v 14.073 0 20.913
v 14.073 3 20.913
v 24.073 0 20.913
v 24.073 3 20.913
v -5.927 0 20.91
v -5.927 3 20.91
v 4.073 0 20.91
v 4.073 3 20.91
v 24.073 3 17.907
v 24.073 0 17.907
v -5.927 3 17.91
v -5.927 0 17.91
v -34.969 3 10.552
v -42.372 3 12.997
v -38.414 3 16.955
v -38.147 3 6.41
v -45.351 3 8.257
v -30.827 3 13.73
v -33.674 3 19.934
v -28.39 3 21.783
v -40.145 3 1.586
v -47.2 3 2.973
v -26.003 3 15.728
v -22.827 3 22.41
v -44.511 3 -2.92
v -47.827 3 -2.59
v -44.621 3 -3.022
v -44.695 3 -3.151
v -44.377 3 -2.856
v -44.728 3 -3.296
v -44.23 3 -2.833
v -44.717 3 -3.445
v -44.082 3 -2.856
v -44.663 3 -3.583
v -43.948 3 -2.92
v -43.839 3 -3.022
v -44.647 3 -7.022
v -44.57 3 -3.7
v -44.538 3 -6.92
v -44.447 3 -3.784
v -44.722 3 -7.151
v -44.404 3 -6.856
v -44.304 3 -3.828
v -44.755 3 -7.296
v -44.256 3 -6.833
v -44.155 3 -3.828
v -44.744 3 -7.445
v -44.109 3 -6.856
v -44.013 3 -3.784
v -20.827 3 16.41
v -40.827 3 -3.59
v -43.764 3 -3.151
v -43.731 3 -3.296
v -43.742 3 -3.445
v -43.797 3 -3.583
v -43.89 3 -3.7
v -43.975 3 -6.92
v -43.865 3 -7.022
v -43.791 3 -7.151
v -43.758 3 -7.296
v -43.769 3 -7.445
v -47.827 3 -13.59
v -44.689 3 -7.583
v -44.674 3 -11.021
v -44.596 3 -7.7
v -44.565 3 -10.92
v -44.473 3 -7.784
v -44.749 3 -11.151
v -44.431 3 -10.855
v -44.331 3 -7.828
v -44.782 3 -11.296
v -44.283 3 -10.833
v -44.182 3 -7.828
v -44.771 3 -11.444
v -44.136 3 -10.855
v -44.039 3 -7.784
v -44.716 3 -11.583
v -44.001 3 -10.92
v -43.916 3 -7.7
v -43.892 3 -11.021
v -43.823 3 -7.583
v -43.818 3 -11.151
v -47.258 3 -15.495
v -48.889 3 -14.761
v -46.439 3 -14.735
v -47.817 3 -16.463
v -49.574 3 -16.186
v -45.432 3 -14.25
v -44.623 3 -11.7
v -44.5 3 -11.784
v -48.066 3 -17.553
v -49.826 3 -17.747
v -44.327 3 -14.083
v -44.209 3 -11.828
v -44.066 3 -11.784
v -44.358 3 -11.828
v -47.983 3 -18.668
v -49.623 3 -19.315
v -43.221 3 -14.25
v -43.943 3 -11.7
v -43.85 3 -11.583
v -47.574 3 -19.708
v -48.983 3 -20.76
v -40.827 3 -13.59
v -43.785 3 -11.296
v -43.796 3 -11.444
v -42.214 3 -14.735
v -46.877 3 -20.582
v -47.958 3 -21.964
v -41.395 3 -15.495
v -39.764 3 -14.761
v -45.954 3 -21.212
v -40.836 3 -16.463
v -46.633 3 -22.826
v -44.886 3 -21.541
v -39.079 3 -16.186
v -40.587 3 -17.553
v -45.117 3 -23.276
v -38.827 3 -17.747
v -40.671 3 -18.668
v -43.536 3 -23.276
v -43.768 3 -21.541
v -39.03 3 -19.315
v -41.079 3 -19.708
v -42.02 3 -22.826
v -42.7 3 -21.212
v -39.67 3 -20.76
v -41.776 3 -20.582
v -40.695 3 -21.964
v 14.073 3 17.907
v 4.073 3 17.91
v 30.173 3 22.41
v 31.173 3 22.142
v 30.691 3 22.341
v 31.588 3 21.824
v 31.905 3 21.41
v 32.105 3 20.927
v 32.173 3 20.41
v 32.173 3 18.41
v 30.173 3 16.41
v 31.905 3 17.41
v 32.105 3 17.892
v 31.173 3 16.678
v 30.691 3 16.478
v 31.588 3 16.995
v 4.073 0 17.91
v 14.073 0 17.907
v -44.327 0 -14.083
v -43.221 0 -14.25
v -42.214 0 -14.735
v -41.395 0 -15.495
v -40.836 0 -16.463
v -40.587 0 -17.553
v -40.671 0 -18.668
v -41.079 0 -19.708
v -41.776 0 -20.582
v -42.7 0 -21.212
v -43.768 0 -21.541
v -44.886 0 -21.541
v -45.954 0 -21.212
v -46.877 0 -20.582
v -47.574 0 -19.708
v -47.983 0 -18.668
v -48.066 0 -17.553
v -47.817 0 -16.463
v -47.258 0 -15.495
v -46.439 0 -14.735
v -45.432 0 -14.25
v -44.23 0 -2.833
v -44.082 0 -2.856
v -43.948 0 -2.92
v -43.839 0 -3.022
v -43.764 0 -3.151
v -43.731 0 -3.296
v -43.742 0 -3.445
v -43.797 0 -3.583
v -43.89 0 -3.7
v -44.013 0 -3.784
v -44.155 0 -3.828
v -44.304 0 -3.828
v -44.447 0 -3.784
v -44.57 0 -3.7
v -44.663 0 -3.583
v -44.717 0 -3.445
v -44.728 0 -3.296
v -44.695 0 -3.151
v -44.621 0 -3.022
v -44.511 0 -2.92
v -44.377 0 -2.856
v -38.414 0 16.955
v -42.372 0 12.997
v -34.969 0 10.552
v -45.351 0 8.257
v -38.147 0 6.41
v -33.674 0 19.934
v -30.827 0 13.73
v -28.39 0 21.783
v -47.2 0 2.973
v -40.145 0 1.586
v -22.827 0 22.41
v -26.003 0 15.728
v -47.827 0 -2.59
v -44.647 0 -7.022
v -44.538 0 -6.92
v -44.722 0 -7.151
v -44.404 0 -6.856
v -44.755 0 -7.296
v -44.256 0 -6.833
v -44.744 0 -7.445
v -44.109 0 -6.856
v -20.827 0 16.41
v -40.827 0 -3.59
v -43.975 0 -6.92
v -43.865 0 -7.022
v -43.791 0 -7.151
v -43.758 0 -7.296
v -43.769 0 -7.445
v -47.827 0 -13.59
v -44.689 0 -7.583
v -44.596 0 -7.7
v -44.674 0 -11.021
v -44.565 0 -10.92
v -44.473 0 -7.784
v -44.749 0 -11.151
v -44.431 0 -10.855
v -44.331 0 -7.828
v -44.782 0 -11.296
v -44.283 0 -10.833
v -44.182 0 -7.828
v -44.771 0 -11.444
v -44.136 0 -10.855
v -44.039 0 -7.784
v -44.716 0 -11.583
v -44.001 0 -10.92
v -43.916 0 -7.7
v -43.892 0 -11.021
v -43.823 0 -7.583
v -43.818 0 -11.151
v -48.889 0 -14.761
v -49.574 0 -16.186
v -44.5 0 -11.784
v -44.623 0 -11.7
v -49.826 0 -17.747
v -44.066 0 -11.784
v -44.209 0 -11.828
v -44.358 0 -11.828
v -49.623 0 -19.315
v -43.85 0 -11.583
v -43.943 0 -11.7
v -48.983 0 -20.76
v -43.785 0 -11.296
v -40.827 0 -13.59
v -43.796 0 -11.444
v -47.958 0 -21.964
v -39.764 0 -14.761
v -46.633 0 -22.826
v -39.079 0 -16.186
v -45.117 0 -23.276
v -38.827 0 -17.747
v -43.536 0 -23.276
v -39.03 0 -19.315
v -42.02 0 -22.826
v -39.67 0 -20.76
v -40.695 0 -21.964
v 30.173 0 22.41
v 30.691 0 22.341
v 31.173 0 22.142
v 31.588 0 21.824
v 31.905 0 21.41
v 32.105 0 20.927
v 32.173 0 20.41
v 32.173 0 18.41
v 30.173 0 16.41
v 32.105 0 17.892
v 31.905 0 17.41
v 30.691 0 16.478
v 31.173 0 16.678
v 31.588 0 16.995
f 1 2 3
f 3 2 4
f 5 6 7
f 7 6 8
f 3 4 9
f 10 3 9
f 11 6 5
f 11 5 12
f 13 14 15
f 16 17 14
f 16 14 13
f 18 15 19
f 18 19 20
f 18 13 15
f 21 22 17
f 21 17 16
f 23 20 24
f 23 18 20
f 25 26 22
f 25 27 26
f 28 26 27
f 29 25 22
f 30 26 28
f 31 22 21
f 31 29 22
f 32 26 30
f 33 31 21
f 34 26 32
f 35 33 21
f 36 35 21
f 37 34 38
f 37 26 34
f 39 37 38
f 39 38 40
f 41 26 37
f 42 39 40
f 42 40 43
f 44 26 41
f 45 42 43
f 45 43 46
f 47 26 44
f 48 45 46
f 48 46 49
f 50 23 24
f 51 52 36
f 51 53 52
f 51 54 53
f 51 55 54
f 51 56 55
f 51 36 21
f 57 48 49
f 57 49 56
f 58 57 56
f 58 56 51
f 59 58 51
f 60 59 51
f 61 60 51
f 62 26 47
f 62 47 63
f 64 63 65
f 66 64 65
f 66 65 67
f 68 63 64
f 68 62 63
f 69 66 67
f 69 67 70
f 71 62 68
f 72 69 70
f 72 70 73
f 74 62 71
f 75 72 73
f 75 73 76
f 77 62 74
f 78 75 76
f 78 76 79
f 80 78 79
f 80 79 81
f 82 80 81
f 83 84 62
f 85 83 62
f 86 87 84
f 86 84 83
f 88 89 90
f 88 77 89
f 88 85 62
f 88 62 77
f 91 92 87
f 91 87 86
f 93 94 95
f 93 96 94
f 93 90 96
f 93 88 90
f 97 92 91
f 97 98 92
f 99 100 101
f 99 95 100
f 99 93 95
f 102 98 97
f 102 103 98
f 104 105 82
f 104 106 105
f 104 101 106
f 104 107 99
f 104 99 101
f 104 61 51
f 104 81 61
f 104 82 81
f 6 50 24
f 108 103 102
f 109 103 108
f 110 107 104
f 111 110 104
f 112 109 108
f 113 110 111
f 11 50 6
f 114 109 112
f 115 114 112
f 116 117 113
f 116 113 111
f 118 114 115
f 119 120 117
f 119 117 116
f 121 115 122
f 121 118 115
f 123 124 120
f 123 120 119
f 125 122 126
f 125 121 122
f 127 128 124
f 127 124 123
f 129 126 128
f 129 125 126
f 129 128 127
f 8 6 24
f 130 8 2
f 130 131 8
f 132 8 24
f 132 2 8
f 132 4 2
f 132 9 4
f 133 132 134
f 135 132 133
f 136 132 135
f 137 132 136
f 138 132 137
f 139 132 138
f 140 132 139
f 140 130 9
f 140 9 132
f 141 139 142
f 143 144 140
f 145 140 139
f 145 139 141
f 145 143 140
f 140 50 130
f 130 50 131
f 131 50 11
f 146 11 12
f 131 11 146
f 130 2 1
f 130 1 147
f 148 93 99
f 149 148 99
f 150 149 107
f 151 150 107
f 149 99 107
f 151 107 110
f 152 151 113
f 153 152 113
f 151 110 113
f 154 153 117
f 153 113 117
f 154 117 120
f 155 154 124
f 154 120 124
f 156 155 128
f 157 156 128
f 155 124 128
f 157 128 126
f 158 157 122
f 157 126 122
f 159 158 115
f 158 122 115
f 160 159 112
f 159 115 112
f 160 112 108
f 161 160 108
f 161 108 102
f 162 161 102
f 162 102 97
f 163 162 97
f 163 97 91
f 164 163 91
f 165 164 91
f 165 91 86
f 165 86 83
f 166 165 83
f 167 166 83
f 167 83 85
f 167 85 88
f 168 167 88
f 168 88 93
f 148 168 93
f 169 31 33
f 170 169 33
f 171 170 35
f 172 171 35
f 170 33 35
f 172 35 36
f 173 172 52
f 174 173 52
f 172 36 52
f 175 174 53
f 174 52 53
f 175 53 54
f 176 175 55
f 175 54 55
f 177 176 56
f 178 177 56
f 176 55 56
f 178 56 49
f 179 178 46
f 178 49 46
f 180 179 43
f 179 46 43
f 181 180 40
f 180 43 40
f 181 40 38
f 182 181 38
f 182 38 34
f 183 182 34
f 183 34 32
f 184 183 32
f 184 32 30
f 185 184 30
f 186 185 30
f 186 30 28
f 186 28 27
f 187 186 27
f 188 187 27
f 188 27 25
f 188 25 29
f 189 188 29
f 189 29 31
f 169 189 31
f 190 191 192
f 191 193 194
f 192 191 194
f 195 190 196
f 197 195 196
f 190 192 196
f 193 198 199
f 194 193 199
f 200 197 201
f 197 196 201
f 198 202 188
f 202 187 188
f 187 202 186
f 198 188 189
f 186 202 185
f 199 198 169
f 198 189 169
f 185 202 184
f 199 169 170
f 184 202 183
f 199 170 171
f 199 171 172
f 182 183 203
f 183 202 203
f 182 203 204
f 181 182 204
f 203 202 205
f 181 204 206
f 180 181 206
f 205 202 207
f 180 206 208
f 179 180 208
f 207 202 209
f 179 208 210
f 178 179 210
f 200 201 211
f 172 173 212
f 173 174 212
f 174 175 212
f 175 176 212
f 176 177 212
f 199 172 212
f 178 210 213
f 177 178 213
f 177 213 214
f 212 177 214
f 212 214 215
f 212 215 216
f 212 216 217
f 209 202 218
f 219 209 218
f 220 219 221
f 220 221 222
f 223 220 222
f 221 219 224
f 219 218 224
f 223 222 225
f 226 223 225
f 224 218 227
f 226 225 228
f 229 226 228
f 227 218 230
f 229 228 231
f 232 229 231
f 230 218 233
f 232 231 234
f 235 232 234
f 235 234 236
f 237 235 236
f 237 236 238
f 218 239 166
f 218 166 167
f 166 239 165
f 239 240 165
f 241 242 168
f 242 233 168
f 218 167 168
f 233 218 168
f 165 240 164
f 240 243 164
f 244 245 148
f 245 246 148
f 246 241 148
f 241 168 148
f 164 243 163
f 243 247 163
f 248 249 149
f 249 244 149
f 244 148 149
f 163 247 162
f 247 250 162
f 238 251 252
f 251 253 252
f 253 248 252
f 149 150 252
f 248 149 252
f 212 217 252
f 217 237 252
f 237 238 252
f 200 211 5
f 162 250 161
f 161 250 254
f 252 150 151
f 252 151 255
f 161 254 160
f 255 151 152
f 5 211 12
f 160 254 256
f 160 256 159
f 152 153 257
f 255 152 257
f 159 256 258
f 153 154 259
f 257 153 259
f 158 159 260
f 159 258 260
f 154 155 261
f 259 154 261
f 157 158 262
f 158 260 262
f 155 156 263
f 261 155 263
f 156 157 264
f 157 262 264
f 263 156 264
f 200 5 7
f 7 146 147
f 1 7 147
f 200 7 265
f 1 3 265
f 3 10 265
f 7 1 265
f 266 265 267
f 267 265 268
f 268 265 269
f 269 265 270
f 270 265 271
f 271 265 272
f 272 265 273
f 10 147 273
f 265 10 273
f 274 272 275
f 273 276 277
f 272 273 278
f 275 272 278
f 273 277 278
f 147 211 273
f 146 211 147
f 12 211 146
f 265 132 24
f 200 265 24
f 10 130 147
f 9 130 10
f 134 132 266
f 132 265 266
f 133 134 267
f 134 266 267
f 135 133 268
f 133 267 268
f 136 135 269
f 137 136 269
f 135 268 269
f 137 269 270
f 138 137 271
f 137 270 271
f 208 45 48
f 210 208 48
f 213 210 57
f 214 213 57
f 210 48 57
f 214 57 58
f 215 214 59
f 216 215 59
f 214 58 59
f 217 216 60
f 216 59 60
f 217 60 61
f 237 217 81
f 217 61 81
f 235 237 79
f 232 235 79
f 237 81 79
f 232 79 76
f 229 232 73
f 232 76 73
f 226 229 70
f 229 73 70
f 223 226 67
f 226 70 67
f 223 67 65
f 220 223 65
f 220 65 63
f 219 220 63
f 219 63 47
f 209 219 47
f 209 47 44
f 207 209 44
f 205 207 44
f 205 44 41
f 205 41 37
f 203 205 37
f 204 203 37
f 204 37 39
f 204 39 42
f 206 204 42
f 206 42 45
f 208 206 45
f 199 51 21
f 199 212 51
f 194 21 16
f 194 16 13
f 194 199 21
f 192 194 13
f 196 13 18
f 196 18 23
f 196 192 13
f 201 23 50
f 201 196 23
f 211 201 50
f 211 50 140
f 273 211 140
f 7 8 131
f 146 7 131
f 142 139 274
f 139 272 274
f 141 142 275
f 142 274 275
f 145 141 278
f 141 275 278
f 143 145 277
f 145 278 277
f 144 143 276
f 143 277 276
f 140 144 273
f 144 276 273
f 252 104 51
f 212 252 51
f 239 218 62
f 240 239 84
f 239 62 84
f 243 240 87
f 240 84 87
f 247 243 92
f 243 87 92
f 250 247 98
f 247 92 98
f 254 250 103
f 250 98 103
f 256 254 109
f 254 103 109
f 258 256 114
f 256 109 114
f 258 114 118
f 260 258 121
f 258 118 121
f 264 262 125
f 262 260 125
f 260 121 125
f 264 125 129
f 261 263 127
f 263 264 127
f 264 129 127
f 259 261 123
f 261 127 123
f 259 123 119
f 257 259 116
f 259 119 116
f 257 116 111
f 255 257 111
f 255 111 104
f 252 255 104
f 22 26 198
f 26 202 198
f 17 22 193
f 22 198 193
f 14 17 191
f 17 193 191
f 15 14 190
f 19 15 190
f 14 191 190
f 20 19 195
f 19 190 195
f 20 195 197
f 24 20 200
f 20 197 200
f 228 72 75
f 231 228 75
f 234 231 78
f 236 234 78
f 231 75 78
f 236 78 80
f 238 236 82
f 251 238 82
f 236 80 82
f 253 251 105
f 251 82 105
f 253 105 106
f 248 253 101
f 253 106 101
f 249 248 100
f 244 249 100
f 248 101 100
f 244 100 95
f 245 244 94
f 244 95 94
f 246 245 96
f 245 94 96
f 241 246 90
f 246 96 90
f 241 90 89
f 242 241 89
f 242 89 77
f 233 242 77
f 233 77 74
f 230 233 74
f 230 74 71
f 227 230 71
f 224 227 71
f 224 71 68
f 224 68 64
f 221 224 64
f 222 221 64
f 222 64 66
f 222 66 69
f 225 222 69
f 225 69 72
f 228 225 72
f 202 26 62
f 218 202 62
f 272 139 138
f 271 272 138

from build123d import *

# Parameters (mm, degrees)
SKETCH1_W           = 100
SKETCH1_H           = 50
BOSS_EXTRUDE1_DEPTH = 3
SKETCH3_W           = 100
SKETCH3_H           = 50
SKETCH3_W_2         = 10
SKETCH3_H_2         = 3.006122746
SKETCH3_H_3         = 3
CUT_EXTRUDE4_DEPTH  = 10
SKETCH4_R           = 1.798549791
CUT_EXTRUDE5_DEPTH  = 10
FILLET1_R           = 20
FILLET2_R           = 25
SKETCH7_R           = 0.5
SKETCH7_R_2         = 3.75
CUT_EXTRUDE7_DEPTH  = 10
FILLET3_R           = 2


with BuildPart() as part:
    # Sketch1 → Boss-Extrude1 (new body)
    with BuildSketch(Plane(origin=(0, 0, 0), x_dir=(1, 0, 0), z_dir=(0, 1, 0))):
        Rectangle(SKETCH1_W, SKETCH1_H)
    extrude(amount=BOSS_EXTRUDE1_DEPTH)

    # Sketch3 → Cut-Extrude4 (cut)
    # profile 1 of 3: a face of its own
    with BuildSketch(Plane(origin=(0, 3, 0), x_dir=(1, 0, 0), z_dir=(0, 1, 0))):
        Rectangle(SKETCH3_W, SKETCH3_H)
        with BuildLine():
            Line((-40.826592013, 13.59041697), (-40.826592013, -16.40958303))
            Line((-40.826592013, -16.40958303), (32.173407987, -16.40958303))
            Line((32.173407987, -16.40958303), (32.173407987, -22.40958303))
            Line((32.173407987, -22.40958303), (-47.826592013, -22.40958303))
            Line((-47.826592013, -22.40958303), (-47.826592013, 13.59041697))
            ThreePointArc((-47.826592013, 13.59041697), (-44.326592013, 23.333057657), (-40.826592013, 13.59041697))
        make_face(mode=Mode.SUBTRACT)
    # profile 2 of 3: a face of its own
    with BuildSketch(Plane(origin=(0, 3, 0), x_dir=(1, 0, 0), z_dir=(0, 1, 0))):
        with Locations((19.073407987, -19.40958303)):
            Rectangle(SKETCH3_W_2, SKETCH3_H_2)
    # profile 3 of 3: a face of its own
    with BuildSketch(Plane(origin=(0, 3, 0), x_dir=(1, 0, 0), z_dir=(0, 1, 0))):
        with Locations((-0.926592013, -19.40958303)):
            Rectangle(SKETCH3_W_2, SKETCH3_H_3)
    extrude(amount=-CUT_EXTRUDE4_DEPTH, mode=Mode.SUBTRACT)

    # Sketch4 → Cut-Extrude5 (cut)
    with BuildSketch(Plane(origin=(0, 3, 0), x_dir=(1, 0, 0), z_dir=(0, 1, 0))):
        with Locations(Location((-44.326592013, 17.833057657, 0), (0, 0, 270))):
            Circle(SKETCH4_R)
    extrude(amount=-CUT_EXTRUDE5_DEPTH, mode=Mode.SUBTRACT)

    # Fillet1
    fillet1_edges = [part.edges().sort_by_distance(p)[0] for p in [
        (-40.826592013, 1.5, 16.40958303),
    ]]
    fillet(fillet1_edges, radius=FILLET1_R)

    # Fillet2
    fillet2_edges = [part.edges().sort_by_distance(p)[0] for p in [
        (-47.826592013, 1.5, 22.40958303),
    ]]
    fillet(fillet2_edges, radius=FILLET2_R)

    # Sketch7 → Cut-Extrude7 (cut)
    with BuildSketch(Plane(origin=(0, 3, 0), x_dir=(1, 0, 0), z_dir=(0, 1, 0))):
        with Locations(Location((-44.283135858, 11.333202923, 0), (0, 0, 270))):
            Circle(SKETCH7_R)
        with Locations(Location((-44.256393609, 7.333292318, 0), (0, 0, 270))):
            Circle(SKETCH7_R)
        with Locations(Location((-44.22965136, 3.333381712, 0), (0, 0, 270))):
            Circle(SKETCH7_R)
        with Locations(Location((-44.326592013, 17.833057657, 0), (0, 0, 270))):
            Circle(SKETCH7_R_2)
    extrude(amount=-CUT_EXTRUDE7_DEPTH, mode=Mode.SUBTRACT)

    # Fillet3
    fillet3_edges = [part.edges().sort_by_distance(p)[0] for p in [
        (32.173407987, 1.5, 22.40958303),
        (32.173407987, 1.5, 16.40958303),
    ]]
    fillet(fillet3_edges, radius=FILLET3_R)


solid = part.part
